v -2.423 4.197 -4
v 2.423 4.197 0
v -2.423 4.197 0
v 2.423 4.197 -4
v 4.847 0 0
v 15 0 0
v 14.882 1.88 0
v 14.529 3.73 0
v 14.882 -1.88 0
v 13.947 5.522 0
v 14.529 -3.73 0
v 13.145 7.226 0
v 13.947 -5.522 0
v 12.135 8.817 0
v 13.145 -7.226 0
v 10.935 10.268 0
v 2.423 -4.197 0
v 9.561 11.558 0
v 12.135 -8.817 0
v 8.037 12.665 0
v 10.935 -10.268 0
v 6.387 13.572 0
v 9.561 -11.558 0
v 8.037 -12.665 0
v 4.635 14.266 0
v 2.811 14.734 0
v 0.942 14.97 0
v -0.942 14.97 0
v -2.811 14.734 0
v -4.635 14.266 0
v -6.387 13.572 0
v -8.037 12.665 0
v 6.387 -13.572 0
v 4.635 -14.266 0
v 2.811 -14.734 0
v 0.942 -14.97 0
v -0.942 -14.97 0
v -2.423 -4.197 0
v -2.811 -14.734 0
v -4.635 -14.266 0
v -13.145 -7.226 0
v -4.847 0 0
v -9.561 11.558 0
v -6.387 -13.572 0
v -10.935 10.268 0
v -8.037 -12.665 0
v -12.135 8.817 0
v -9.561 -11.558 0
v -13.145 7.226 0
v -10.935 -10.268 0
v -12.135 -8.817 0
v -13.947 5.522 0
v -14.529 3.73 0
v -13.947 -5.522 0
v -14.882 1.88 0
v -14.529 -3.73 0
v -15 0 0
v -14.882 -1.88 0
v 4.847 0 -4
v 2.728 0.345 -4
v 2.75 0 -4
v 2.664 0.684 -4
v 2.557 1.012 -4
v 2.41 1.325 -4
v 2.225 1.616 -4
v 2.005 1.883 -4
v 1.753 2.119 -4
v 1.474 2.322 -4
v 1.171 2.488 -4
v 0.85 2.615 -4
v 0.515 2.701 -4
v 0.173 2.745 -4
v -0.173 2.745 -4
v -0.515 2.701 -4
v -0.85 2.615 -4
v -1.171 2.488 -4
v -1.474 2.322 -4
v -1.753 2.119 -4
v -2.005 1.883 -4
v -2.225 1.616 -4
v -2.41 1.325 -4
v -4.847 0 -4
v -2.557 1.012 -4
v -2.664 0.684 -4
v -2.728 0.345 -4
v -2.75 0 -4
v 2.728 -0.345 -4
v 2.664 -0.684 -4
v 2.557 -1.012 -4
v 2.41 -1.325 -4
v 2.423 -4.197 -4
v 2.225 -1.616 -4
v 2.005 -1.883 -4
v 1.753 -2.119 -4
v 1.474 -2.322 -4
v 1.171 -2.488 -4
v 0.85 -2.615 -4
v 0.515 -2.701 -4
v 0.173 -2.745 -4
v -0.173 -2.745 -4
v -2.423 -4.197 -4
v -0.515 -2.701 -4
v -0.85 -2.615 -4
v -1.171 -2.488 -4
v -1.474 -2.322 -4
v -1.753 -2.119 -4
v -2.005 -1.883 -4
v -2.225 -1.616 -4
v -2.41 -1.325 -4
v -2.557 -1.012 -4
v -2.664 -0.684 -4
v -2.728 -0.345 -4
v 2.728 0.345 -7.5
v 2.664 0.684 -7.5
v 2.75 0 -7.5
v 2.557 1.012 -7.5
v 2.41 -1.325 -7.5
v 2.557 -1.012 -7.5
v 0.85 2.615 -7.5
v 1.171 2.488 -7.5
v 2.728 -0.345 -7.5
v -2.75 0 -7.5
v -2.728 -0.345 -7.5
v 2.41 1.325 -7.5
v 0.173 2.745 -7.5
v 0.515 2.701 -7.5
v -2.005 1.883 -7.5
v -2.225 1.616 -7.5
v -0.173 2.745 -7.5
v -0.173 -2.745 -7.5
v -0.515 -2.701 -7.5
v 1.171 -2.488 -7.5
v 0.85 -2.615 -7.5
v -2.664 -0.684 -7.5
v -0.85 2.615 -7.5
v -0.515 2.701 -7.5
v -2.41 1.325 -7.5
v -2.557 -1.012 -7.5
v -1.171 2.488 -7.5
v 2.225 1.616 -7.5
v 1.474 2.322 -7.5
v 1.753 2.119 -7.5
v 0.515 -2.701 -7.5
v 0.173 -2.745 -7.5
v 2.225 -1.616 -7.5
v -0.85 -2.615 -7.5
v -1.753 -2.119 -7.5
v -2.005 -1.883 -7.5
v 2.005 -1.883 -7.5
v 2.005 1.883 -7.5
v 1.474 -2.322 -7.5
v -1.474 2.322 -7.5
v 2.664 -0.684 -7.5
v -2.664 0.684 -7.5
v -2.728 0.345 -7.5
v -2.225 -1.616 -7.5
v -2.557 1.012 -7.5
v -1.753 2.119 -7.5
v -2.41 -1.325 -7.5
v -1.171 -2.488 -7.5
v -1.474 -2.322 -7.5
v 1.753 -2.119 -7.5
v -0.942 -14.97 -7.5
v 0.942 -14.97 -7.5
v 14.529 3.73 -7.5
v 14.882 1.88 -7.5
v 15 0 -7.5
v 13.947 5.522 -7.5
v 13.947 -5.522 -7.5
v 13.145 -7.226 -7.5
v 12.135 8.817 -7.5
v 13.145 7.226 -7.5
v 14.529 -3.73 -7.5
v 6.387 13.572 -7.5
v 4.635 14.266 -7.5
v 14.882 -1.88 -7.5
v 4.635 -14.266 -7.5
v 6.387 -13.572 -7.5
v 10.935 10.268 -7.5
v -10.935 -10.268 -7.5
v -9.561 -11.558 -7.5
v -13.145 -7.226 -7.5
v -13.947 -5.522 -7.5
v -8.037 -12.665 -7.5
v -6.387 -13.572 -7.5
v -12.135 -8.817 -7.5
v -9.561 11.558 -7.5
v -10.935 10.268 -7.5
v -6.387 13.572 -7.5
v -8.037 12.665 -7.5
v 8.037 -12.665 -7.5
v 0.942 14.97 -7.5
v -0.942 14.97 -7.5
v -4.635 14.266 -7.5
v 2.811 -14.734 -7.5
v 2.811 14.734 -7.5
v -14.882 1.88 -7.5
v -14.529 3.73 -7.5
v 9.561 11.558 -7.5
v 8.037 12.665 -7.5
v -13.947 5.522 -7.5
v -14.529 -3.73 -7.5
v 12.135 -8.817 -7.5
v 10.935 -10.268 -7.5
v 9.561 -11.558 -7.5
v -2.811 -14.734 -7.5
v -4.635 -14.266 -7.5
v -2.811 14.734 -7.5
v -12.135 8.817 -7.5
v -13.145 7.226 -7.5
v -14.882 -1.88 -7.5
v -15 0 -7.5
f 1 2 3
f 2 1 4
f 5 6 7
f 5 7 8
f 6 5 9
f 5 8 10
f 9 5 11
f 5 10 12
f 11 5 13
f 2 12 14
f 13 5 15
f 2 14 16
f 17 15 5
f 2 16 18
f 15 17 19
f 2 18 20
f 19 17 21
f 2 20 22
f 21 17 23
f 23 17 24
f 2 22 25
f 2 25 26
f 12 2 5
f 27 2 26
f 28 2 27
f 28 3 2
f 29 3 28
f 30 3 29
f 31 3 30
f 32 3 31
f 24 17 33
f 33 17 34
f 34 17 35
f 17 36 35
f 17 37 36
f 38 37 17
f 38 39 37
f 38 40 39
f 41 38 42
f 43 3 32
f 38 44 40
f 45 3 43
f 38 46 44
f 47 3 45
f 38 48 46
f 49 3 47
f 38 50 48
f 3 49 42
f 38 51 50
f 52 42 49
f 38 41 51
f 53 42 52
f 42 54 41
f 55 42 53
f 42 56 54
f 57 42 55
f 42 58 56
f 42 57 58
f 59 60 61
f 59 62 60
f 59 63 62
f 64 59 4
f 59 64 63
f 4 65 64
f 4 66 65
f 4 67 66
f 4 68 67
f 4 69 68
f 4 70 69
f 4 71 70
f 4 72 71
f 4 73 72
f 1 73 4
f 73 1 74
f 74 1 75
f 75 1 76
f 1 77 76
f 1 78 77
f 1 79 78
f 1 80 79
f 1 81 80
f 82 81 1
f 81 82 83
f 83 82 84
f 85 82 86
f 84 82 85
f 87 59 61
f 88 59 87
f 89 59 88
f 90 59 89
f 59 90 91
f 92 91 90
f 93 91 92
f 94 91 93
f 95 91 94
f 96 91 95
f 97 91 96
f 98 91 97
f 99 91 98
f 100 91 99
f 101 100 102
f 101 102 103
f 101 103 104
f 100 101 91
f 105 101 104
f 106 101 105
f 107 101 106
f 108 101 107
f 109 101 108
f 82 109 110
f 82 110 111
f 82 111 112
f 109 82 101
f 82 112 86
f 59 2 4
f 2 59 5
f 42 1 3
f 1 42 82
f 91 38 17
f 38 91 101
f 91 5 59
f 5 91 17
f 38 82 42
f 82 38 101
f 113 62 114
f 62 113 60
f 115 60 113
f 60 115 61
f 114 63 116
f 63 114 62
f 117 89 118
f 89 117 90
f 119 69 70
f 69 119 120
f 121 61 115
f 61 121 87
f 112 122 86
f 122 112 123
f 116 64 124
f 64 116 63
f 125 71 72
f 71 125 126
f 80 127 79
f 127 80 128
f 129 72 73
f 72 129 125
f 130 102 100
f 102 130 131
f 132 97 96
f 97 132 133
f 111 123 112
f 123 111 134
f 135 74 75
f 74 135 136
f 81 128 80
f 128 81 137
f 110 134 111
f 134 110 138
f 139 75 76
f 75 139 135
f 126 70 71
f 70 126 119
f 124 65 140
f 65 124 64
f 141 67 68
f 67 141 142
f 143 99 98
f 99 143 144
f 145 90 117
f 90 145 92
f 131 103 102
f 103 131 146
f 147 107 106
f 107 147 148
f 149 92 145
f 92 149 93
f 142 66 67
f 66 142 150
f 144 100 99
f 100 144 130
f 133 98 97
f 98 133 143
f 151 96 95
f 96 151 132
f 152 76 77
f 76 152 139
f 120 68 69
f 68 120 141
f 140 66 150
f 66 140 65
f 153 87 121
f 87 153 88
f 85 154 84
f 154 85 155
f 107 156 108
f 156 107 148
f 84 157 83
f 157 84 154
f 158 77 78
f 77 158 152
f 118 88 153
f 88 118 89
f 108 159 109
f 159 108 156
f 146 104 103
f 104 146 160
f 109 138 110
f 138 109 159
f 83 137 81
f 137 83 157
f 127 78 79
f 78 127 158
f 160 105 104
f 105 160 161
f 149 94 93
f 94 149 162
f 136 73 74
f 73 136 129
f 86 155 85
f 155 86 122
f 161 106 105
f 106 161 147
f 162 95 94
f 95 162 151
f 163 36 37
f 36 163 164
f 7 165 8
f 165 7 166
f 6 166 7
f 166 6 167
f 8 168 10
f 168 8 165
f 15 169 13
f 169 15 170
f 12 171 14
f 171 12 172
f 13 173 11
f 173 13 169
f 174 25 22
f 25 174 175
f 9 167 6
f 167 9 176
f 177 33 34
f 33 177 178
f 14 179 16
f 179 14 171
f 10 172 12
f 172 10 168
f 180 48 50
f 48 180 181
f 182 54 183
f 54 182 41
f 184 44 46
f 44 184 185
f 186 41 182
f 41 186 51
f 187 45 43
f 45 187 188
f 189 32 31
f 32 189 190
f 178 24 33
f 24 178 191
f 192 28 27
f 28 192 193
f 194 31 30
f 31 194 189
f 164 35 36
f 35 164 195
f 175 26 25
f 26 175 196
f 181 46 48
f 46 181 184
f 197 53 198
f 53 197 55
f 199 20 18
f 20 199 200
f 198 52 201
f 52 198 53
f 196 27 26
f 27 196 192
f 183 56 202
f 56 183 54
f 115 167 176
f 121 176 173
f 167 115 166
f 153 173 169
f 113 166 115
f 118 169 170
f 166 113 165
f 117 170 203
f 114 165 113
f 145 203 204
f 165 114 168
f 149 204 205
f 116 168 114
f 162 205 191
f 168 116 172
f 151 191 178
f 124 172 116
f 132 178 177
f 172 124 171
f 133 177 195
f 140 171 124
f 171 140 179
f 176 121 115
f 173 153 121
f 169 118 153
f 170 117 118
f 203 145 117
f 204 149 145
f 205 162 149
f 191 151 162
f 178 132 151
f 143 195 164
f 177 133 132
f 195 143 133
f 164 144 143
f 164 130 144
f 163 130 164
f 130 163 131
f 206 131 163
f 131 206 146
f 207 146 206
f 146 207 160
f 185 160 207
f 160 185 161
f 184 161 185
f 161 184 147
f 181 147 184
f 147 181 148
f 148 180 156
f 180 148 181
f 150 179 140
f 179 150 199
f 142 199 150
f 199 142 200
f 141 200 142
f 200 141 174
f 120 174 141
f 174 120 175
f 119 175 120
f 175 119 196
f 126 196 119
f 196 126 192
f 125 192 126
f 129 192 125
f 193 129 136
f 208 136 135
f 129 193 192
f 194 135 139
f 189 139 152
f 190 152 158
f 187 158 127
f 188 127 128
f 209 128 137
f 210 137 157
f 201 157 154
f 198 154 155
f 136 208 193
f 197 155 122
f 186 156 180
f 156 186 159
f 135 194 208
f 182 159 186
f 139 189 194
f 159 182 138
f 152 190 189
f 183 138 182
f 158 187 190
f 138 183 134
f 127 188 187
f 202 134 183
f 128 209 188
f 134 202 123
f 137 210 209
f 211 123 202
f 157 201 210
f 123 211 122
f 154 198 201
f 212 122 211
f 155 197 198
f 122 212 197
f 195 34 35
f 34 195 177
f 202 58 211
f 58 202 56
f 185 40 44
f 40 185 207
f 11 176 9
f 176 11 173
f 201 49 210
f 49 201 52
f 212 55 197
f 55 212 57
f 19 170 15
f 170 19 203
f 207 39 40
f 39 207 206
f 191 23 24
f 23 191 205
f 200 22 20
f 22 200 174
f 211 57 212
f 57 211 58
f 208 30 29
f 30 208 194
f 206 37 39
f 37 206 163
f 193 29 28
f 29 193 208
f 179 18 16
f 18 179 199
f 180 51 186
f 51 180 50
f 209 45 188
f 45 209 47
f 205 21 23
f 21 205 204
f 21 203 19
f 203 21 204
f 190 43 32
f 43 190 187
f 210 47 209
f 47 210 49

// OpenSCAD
$fn = 50;

difference() {
	union() {
		translate(v = [0, 0, -7.5]) {
			cylinder(h = 7.5, r = 15.0);
		}
	}
	union() {
		translate(v = [0, 0, 0]) {
			rotate(a = [0, 0, 0]) {
				difference() {
					union() {
						translate(v = [0, 0, -4]) {
							linear_extrude(height = 4) {
								polygon(points = [[4.8468, 0.0], [2.4234000000000004, 4.197451927062417], [-2.423399999999999, 4.197451927062417], [-4.8468, 5.935618106107392e-16], [-2.423400000000002, -4.197451927062416], [2.423399999999997, -4.197451927062419]]);
							}
						}
					}
					union();
				}
			}
		}
		#translate(v = [0, 0, -100.0]) {
			cylinder(h = 200, r = 2.75);
		}
	}
}
